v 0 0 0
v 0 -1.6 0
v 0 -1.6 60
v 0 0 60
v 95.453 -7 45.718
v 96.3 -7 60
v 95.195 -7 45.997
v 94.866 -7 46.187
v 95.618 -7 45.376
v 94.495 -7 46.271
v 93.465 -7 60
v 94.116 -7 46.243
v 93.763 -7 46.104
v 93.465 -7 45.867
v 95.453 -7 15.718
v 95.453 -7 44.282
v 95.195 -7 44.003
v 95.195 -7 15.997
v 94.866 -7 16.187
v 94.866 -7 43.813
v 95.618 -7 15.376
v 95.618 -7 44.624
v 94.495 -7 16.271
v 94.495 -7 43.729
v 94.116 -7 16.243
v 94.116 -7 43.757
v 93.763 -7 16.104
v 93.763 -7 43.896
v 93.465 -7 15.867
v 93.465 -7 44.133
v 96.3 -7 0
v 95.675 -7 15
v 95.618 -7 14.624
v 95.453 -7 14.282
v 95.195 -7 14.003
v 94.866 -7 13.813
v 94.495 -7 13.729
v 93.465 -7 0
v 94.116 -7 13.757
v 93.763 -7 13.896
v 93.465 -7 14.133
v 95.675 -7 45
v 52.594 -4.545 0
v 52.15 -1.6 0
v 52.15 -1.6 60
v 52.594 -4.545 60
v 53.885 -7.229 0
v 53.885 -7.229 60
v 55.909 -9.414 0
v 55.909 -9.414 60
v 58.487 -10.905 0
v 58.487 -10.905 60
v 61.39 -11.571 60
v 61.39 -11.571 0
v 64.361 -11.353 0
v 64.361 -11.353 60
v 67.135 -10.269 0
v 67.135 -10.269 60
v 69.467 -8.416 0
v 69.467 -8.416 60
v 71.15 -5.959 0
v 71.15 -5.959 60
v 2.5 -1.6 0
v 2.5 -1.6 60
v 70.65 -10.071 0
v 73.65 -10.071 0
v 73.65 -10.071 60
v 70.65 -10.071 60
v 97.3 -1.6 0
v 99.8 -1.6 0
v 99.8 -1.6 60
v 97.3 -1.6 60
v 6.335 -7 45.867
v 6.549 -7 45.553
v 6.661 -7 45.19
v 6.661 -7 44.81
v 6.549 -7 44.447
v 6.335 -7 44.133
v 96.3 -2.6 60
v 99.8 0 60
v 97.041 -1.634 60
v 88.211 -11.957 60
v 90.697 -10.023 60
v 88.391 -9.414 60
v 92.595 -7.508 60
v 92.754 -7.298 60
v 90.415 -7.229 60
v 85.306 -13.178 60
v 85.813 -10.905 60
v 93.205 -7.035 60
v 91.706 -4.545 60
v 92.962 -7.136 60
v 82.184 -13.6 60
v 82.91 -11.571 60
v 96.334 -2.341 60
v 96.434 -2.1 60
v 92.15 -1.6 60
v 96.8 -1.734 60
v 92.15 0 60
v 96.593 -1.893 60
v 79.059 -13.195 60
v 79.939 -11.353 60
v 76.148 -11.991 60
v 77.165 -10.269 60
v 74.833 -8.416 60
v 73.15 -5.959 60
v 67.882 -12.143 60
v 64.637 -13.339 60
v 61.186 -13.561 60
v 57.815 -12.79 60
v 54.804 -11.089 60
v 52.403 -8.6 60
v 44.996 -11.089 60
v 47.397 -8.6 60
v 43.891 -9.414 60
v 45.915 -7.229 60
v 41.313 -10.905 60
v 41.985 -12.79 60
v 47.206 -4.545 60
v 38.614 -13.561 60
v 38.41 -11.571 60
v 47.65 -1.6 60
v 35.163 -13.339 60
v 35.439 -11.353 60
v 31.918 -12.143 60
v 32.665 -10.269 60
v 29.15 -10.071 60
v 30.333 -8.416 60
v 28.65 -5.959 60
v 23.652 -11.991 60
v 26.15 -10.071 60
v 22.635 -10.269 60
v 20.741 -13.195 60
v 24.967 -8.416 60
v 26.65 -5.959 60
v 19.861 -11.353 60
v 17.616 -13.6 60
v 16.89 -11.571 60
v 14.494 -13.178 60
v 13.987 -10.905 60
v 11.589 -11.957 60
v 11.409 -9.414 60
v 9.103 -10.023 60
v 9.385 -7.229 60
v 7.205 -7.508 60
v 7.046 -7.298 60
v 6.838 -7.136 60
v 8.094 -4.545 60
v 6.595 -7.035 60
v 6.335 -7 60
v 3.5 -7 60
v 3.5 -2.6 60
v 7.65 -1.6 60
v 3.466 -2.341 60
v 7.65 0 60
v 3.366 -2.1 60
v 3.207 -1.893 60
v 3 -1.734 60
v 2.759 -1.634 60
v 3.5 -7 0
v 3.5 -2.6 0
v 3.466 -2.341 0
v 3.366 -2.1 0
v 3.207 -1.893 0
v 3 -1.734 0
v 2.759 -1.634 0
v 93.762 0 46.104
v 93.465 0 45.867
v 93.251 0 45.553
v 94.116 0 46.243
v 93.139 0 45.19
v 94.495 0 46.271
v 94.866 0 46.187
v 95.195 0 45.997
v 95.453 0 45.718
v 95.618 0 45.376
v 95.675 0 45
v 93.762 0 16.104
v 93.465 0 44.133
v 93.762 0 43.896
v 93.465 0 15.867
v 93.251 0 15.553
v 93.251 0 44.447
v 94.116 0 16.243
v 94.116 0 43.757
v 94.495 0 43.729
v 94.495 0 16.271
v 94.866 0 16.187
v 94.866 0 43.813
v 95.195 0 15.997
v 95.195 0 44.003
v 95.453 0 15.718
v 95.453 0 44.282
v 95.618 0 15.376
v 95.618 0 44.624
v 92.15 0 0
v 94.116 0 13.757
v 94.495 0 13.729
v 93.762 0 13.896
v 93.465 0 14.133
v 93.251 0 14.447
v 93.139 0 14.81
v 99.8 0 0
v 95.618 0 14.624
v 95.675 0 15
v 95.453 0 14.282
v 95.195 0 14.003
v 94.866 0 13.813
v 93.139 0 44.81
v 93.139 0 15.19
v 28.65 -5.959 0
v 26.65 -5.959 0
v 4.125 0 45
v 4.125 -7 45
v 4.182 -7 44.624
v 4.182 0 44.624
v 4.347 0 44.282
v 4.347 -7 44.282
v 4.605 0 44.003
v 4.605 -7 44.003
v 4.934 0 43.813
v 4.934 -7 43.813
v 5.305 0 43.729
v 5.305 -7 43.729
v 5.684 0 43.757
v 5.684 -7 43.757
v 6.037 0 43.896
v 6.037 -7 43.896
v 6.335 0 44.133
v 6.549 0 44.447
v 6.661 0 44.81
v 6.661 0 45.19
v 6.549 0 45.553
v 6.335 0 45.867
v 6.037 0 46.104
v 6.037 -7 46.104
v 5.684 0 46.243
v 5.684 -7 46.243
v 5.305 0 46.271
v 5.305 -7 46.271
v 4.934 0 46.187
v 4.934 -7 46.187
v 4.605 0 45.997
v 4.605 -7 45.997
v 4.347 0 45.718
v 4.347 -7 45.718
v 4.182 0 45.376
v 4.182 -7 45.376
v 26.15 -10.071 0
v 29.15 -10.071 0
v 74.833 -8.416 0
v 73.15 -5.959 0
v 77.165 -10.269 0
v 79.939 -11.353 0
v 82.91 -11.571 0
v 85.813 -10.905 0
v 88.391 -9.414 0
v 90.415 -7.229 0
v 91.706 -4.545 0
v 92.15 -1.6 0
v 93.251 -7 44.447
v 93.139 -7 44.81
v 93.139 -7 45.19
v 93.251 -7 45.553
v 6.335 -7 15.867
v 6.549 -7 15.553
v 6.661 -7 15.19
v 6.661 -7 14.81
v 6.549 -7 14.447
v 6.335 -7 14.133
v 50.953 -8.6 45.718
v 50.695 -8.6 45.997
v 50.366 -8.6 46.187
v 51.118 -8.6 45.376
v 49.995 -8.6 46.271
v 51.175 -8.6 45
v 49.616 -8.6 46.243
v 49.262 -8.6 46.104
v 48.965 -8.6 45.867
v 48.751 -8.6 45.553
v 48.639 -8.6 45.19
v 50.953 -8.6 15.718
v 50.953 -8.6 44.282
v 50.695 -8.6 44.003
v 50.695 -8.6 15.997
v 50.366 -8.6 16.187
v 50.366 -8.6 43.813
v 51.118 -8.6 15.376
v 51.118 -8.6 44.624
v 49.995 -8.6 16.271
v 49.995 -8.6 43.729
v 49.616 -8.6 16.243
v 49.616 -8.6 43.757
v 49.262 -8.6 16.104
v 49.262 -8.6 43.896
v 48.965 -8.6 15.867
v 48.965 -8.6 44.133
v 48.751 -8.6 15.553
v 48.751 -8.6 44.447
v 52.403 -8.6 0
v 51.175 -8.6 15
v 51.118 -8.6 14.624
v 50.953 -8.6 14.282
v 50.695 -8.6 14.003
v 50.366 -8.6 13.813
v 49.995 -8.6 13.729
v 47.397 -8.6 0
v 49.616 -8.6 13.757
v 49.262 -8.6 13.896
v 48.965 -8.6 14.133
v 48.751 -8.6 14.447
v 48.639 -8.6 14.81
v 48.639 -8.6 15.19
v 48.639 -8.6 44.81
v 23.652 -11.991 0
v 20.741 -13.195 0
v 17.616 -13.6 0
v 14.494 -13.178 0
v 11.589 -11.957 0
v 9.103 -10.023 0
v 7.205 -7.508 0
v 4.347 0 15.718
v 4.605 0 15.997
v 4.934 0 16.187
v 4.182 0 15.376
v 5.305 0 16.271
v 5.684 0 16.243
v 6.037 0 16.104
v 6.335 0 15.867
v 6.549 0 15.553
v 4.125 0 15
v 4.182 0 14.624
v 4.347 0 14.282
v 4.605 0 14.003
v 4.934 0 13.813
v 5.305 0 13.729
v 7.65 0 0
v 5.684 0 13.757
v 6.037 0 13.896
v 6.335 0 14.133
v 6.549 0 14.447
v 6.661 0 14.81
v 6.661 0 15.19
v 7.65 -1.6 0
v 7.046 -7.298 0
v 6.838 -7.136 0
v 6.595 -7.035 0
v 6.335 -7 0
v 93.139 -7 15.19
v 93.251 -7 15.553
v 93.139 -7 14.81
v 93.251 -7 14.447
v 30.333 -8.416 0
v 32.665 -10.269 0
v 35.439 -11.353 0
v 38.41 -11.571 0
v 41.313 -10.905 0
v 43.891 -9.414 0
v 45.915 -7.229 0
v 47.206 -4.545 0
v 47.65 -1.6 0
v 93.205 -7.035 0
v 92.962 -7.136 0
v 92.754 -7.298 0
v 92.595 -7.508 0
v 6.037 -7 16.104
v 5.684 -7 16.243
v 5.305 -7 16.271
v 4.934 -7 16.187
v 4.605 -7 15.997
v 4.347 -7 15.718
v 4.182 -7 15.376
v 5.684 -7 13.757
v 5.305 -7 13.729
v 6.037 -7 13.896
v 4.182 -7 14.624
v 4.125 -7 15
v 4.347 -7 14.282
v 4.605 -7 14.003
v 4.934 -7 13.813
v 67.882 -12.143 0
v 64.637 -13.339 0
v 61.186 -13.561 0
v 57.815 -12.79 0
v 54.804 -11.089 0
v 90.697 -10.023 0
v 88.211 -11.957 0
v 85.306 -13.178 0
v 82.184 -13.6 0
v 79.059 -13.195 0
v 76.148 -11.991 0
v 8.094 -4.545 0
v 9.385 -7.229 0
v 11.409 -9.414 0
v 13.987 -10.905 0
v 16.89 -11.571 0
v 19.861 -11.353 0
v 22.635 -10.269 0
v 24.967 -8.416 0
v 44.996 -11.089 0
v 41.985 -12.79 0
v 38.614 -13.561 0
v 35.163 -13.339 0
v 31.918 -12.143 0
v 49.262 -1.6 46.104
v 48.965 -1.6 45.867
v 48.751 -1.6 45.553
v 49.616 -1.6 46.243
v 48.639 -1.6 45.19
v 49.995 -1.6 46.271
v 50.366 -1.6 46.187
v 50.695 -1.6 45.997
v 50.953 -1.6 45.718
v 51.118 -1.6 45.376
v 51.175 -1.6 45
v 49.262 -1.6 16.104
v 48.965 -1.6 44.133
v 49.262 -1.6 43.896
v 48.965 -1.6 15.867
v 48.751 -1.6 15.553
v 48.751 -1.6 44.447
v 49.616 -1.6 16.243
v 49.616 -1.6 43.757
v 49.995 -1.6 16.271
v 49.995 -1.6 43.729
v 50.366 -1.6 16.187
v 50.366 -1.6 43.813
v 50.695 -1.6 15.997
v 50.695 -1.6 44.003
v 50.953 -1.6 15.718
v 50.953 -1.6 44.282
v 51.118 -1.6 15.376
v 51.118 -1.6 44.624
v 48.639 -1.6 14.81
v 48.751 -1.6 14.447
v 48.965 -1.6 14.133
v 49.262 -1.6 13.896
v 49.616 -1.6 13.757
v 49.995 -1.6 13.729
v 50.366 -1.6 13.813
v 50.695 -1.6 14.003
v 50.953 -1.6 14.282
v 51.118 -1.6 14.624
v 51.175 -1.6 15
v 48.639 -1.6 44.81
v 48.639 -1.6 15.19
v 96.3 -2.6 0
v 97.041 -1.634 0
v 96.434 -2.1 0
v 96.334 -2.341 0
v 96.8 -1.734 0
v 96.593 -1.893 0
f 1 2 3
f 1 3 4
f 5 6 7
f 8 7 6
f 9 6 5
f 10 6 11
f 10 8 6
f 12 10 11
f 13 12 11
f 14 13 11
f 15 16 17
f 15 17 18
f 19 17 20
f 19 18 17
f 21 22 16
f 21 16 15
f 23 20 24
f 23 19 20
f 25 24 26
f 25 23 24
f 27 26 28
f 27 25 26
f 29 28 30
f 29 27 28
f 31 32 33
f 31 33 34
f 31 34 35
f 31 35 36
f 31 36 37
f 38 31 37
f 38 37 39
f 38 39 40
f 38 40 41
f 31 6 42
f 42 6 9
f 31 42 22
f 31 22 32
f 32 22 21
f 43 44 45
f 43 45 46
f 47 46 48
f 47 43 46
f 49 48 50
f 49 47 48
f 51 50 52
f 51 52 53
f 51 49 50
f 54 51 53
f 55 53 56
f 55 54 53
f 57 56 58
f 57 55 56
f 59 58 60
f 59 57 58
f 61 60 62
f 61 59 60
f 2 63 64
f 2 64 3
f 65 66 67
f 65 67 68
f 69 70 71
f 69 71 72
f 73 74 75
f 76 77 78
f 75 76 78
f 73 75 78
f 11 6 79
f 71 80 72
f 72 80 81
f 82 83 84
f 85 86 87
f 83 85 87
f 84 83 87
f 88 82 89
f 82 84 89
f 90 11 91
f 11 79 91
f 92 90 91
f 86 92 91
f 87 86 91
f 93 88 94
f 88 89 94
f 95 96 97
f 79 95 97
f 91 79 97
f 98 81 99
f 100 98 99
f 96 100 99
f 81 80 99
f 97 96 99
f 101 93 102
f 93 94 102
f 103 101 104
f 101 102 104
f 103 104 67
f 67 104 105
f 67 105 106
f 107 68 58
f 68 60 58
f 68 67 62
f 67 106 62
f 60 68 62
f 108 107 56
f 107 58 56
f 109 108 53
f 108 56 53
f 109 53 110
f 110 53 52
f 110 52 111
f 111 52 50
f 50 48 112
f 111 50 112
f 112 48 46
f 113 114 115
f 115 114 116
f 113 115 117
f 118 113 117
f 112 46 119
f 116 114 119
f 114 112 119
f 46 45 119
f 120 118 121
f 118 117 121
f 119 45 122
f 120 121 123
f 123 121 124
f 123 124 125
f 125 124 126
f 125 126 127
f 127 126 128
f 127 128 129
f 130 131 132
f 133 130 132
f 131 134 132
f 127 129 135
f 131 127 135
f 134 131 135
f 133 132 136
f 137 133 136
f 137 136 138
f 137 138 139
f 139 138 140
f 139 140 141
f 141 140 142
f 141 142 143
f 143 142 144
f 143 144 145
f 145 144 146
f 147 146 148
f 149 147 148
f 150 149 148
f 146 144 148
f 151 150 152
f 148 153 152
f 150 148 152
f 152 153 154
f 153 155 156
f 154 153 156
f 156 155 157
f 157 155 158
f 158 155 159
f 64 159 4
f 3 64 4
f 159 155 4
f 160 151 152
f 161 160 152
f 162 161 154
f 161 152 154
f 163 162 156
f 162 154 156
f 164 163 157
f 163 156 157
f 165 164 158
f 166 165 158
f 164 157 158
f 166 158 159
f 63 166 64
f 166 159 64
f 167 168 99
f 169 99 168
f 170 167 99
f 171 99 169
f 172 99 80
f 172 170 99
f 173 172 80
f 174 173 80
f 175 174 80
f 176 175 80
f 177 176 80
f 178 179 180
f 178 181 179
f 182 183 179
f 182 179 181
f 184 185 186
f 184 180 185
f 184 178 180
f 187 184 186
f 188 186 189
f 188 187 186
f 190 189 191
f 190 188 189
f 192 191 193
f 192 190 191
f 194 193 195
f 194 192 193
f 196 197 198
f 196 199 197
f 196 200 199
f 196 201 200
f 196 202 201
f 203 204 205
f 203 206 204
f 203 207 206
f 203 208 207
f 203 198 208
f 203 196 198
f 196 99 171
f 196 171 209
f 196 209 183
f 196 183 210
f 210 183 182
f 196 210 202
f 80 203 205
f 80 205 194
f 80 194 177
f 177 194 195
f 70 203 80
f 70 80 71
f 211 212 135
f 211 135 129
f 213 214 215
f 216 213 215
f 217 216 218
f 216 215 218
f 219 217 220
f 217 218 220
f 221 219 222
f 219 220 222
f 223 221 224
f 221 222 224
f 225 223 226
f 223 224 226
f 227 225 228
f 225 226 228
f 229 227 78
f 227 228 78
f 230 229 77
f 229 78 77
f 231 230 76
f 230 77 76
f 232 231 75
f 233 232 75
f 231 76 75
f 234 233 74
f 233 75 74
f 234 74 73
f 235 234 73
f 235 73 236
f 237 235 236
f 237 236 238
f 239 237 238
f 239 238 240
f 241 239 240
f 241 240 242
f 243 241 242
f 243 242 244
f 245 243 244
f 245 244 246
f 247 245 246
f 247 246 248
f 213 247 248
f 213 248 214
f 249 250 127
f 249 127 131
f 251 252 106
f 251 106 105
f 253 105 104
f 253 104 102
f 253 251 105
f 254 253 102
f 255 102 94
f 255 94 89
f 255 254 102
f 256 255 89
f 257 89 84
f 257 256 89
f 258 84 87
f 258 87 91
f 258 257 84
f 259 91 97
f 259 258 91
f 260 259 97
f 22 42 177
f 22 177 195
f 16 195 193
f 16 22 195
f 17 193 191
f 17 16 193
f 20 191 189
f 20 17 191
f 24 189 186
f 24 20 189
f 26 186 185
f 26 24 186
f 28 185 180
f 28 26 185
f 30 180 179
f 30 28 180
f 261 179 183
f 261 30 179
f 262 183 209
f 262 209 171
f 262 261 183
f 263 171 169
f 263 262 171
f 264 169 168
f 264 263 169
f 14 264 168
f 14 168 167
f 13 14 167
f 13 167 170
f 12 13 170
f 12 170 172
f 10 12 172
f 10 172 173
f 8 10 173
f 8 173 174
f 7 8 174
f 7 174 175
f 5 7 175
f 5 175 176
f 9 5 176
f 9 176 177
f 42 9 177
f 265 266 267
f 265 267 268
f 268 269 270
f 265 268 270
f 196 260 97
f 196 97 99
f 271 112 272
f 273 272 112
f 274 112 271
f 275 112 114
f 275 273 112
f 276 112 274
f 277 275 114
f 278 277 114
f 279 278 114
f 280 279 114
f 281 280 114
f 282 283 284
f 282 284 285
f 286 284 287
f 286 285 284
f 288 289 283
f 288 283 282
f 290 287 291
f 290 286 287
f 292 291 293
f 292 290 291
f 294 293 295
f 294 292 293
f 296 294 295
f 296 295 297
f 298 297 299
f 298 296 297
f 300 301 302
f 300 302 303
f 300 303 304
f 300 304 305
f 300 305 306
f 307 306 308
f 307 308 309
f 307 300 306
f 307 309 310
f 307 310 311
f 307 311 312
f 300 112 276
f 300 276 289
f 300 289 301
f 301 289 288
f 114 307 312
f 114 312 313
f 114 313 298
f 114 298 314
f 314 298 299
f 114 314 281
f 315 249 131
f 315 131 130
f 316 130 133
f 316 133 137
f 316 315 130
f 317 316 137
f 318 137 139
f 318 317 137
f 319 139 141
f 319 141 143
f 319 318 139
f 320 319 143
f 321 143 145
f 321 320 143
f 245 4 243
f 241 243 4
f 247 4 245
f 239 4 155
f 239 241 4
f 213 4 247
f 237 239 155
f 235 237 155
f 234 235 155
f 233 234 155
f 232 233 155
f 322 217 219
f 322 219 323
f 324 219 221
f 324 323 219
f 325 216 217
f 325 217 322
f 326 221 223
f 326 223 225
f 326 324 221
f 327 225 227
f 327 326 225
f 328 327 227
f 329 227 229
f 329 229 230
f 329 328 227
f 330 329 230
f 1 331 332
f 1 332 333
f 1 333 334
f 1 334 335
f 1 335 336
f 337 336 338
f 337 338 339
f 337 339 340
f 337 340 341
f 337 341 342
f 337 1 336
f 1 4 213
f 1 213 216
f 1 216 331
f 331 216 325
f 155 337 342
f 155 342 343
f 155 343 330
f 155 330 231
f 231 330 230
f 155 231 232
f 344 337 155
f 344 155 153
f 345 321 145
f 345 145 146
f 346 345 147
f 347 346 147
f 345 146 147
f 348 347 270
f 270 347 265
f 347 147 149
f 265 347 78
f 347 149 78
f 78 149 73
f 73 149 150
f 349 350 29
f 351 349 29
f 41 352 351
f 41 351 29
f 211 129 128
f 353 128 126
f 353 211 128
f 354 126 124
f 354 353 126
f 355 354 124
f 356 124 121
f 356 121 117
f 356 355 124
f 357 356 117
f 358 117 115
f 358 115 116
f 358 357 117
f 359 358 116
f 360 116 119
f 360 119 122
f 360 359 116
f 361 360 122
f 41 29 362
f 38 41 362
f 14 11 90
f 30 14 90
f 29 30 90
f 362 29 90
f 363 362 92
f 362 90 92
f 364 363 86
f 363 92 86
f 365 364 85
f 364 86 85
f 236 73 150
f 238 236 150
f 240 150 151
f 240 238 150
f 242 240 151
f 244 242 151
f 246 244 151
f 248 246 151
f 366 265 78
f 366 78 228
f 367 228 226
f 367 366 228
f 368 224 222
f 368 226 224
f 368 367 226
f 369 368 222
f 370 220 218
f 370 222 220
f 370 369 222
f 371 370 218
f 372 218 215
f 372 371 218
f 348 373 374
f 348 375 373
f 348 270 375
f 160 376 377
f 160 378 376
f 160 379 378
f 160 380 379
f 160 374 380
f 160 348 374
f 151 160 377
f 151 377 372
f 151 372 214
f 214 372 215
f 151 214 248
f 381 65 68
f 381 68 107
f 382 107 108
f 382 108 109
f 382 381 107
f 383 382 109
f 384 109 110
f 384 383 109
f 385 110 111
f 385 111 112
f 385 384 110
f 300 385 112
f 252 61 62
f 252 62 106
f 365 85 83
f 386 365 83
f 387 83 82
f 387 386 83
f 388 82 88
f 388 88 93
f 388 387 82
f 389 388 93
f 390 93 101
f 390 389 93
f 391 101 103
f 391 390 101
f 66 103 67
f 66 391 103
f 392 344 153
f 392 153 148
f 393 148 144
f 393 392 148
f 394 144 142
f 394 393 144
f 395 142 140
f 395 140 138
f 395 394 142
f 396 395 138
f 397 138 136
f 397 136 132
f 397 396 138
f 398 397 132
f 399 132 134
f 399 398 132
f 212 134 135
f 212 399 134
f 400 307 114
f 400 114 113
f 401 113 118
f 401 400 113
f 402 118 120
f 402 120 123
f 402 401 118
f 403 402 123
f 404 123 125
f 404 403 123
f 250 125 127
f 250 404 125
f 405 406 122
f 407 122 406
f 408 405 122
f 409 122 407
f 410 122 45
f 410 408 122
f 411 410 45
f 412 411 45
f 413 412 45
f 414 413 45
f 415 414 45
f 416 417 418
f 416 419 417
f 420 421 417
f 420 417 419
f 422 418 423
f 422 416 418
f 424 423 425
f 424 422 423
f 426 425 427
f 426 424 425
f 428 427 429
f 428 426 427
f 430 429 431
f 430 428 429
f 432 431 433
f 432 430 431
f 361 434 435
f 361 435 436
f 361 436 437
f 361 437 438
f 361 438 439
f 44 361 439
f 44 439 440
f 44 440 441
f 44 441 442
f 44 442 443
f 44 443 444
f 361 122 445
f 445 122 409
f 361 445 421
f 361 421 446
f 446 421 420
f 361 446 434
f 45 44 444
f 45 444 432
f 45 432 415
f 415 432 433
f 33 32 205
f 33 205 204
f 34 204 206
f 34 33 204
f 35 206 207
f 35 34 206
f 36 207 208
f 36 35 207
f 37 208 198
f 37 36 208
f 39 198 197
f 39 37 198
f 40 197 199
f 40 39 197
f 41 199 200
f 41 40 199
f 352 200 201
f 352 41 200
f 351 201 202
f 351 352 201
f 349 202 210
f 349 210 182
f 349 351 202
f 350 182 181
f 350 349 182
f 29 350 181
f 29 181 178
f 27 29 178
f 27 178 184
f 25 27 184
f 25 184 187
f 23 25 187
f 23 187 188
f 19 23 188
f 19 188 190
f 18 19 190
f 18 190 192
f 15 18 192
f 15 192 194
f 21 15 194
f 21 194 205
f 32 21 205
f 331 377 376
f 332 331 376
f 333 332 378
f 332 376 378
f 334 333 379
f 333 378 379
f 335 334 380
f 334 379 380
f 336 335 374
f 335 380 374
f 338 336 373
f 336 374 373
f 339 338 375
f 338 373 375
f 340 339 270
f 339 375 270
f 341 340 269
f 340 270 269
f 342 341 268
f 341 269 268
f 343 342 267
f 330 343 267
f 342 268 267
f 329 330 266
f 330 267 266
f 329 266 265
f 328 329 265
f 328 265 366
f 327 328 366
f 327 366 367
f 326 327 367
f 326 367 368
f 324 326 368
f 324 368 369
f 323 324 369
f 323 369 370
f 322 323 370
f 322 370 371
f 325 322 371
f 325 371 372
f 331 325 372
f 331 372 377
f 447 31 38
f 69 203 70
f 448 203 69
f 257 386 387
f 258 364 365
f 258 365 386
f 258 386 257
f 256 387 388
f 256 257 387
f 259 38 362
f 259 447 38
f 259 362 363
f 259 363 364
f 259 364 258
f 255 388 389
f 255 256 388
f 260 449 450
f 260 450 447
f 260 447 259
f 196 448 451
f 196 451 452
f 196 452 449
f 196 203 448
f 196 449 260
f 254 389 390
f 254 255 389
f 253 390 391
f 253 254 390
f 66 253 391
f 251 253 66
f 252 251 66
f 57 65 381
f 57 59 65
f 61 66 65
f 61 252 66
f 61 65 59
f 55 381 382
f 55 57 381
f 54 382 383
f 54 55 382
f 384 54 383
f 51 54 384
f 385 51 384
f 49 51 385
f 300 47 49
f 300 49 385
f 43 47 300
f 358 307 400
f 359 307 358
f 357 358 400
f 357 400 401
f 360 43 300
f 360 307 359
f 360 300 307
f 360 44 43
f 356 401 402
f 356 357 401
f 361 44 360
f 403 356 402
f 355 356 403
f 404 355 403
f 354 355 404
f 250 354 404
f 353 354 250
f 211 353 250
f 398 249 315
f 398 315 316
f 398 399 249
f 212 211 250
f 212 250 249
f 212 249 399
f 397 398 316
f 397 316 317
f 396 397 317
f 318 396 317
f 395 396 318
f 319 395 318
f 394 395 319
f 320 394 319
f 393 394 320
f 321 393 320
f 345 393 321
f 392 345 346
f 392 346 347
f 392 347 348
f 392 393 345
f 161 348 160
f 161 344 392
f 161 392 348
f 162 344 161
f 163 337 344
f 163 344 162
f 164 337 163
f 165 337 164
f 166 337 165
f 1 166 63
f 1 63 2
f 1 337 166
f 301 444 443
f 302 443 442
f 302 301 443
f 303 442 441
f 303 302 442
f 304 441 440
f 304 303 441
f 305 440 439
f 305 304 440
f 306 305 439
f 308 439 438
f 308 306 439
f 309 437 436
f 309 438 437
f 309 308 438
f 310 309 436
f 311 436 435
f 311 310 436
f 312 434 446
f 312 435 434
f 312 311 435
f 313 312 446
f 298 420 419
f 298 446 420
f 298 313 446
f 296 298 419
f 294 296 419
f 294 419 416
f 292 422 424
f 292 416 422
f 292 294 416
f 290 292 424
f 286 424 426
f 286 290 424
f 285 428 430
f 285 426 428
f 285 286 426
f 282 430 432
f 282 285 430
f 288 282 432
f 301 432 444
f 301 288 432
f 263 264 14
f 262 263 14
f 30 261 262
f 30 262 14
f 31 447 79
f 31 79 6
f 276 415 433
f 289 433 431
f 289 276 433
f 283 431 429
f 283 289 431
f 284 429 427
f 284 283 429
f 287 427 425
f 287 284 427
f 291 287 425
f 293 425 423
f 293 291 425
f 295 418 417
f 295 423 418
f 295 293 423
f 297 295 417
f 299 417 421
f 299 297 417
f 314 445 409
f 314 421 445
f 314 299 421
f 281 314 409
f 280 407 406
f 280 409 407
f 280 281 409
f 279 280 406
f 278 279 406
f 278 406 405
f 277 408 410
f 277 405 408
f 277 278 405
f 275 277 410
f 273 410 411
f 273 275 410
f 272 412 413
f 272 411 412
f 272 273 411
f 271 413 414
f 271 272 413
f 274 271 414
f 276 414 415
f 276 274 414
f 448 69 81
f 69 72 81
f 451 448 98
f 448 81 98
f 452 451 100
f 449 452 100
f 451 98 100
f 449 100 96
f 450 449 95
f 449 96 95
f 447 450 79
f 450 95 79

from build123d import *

# Parameters (mm, degrees)
BOSS_EXTRUDE1_DEPTH                         = 60
FILLET1_R                                   = 1
TAPPED_START                                = -7
TAPPED_HOLE_FOR_M2_5X0_45_HELICOIL1_OUTL_R  = 1.275
TAPPED_HOLE_FOR_M2_5X0_45_HELICOIL1_DEPTH   = 7
TAPPED_START_2                              = -8.6
TAPPED_HOLE_FOR_M2_5X0_45_HELICOIL1_2_OU_R  = 1.275
TAPPED_HOLE_FOR_M2_5X0_45_HELICOIL1_2_DEPTH = 1.6


# Read off the part's stored shape, not the designer's step: Tapped Hole for M2.5x0.45 Helicoil1
with BuildPart() as part:
    # Sketch1 → Boss-Extrude1 (new body)
    with BuildSketch(Plane.XY):
        with BuildLine():
            Line((0, 0), (7.65, 0))
            Line((7.65, 0), (7.65, -1.6))
            ThreePointArc((7.65, -1.6), (15.413932023, -11.346794345), (26.65, -5.958898944))
            Line((26.65, -5.958898944), (28.65, -5.958898944))
            ThreePointArc((28.65, -5.958898944), (39.886067977, -11.346794345), (47.65, -1.6))
            Line((47.65, -1.6), (52.15, -1.6))
            ThreePointArc((52.15, -1.6), (59.913932023, -11.346794345), (71.15, -5.958898944))
            Line((71.15, -5.958898944), (73.15, -5.958898944))
            ThreePointArc((73.15, -5.958898944), (84.386067977, -11.346794345), (92.15, -1.6))
            Line((92.15, -1.6), (92.15, 0))
            Line((92.15, 0), (99.8, 0))
            Line((99.8, 0), (99.8, -1.6))
            Line((99.8, -1.6), (96.3, -1.6))
            Line((96.3, -1.6), (96.3, -7))
            Line((96.3, -7), (92.86634266, -7))
            ThreePointArc((92.86634266, -7), (84.043434268, -13.449679602), (73.65, -10.070537173))
            Line((73.65, -10.070537173), (70.65, -10.070537173))
            ThreePointArc((70.65, -10.070537173), (61.186027008, -13.561218837), (52.403205655, -8.6))
            Line((52.403205655, -8.6), (47.396794345, -8.6))
            ThreePointArc((47.396794345, -8.6), (38.613972992, -13.561218837), (29.15, -10.070537173))
            Line((29.15, -10.070537173), (26.15, -10.070537173))
            ThreePointArc((26.15, -10.070537173), (15.756565732, -13.449679602), (6.93365734, -7))
            Line((6.93365734, -7), (3.5, -7))
            Line((3.5, -7), (3.5, -1.6))
            Line((3.5, -1.6), (0, -1.6))
            Line((0, -1.6), (0, 0))
        make_face()
    extrude(amount=BOSS_EXTRUDE1_DEPTH)

    # Fillet1
    fillet1_edges = [part.edges().sort_by_distance(p)[0] for p in [
        (96.3, -1.6, 30),
        (92.86634266, -7, 30),
        (6.93365734, -7, 30),
        (3.5, -1.6, 30),
    ]]
    fillet(fillet1_edges, radius=FILLET1_R)

    # Tapped Hole for M2.5x0.45 Helicoil1 outl → Tapped Hole for M2.5x0.45 Helicoil1 (cut)
    with BuildSketch(Plane(origin=(0, 0, 0), x_dir=(1, 0, 0), z_dir=(0, 1, 0)).offset(TAPPED_START)):
        with Locations((94.4, -15)):
            Circle(TAPPED_HOLE_FOR_M2_5X0_45_HELICOIL1_OUTL_R)
        with Locations((94.4, -45)):
            Circle(TAPPED_HOLE_FOR_M2_5X0_45_HELICOIL1_OUTL_R)
        with Locations((49.9, -15)):
            Circle(TAPPED_HOLE_FOR_M2_5X0_45_HELICOIL1_OUTL_R)
        with Locations((49.9, -45)):
            Circle(TAPPED_HOLE_FOR_M2_5X0_45_HELICOIL1_OUTL_R)
    tapped_hole_for_m2_5x0_45_helicoil1 = extrude(amount=TAPPED_HOLE_FOR_M2_5X0_45_HELICOIL1_DEPTH, mode=Mode.SUBTRACT)

    # Tapped Hole for M2.5x0.45 Helicoil1 2 ou → Tapped Hole for M2.5x0.45 Helicoil1 2 (cut)
    with BuildSketch(Plane(origin=(0, 0, 0), x_dir=(1, 0, 0), z_dir=(0, 1, 0)).offset(TAPPED_START_2)):
        with Locations((49.9, -15)):
            Circle(TAPPED_HOLE_FOR_M2_5X0_45_HELICOIL1_2_OU_R)
        with Locations((49.9, -45)):
            Circle(TAPPED_HOLE_FOR_M2_5X0_45_HELICOIL1_2_OU_R)
    tapped_hole_for_m2_5x0_45_helicoil1_2 = extrude(amount=TAPPED_HOLE_FOR_M2_5X0_45_HELICOIL1_2_DEPTH, mode=Mode.SUBTRACT)

    # Mirror1: Tapped Hole for M2.5x0.45 Helicoil1, Tapped Hole for M2.5x0.45 Helicoil1 2 across plane
    add(tapped_hole_for_m2_5x0_45_helicoil1.mirror(Plane.ZY.offset(-49.9)), mode=Mode.SUBTRACT)
    add(tapped_hole_for_m2_5x0_45_helicoil1_2.mirror(Plane.ZY.offset(-49.9)), mode=Mode.SUBTRACT)


solid = part.part
